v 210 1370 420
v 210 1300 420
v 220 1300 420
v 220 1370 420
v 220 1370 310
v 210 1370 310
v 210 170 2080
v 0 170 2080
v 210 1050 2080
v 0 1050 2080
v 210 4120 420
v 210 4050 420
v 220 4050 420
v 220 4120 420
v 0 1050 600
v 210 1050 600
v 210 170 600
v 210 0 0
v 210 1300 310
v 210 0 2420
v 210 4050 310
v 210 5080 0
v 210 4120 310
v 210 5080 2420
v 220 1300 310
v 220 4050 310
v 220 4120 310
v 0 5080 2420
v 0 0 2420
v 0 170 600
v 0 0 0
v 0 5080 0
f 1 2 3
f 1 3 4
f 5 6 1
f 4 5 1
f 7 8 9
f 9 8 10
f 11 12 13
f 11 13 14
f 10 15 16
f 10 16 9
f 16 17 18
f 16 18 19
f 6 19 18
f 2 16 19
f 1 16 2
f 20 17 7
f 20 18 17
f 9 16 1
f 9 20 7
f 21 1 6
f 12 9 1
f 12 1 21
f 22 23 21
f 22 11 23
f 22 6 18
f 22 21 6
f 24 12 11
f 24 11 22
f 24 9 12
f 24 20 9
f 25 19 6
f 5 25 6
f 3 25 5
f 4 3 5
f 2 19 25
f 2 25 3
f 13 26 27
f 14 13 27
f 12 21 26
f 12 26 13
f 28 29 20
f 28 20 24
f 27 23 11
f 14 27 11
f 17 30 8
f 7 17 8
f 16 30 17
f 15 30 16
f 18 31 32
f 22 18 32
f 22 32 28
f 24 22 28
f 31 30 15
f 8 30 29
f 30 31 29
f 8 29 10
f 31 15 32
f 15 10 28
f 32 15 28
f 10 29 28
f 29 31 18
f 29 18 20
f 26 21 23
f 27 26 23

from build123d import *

# Parameters (mm, degrees)
SKETCH_W     = 5080
SKETCH_H     = 2420
SKETCH_W_2   = 880
SKETCH_H_2   = 1480
PAD_DEPTH    = 210
SKETCH001_W  = 70
SKETCH001_H  = 110
PAD001_DEPTH = 10


with BuildPart() as part:
    # Sketch → Pad (new body)
    with BuildSketch(Plane.YZ):
        with Locations((2540, 1210)):
            Rectangle(SKETCH_W, SKETCH_H)
        with Locations((610, 1340)):
            Rectangle(SKETCH_W_2, SKETCH_H_2, mode=Mode.SUBTRACT)
    extrude(amount=PAD_DEPTH)

    # Sketch001 (on Face10 of Pad) → Pad001 (join)
    with BuildSketch(Plane.YZ.offset(210)):
        with Locations((1335, 365)):
            Rectangle(SKETCH001_W, SKETCH001_H)
        with Locations((4085, 365)):
            Rectangle(SKETCH001_W, SKETCH001_H)
    extrude(amount=PAD001_DEPTH)


solid = part.part
